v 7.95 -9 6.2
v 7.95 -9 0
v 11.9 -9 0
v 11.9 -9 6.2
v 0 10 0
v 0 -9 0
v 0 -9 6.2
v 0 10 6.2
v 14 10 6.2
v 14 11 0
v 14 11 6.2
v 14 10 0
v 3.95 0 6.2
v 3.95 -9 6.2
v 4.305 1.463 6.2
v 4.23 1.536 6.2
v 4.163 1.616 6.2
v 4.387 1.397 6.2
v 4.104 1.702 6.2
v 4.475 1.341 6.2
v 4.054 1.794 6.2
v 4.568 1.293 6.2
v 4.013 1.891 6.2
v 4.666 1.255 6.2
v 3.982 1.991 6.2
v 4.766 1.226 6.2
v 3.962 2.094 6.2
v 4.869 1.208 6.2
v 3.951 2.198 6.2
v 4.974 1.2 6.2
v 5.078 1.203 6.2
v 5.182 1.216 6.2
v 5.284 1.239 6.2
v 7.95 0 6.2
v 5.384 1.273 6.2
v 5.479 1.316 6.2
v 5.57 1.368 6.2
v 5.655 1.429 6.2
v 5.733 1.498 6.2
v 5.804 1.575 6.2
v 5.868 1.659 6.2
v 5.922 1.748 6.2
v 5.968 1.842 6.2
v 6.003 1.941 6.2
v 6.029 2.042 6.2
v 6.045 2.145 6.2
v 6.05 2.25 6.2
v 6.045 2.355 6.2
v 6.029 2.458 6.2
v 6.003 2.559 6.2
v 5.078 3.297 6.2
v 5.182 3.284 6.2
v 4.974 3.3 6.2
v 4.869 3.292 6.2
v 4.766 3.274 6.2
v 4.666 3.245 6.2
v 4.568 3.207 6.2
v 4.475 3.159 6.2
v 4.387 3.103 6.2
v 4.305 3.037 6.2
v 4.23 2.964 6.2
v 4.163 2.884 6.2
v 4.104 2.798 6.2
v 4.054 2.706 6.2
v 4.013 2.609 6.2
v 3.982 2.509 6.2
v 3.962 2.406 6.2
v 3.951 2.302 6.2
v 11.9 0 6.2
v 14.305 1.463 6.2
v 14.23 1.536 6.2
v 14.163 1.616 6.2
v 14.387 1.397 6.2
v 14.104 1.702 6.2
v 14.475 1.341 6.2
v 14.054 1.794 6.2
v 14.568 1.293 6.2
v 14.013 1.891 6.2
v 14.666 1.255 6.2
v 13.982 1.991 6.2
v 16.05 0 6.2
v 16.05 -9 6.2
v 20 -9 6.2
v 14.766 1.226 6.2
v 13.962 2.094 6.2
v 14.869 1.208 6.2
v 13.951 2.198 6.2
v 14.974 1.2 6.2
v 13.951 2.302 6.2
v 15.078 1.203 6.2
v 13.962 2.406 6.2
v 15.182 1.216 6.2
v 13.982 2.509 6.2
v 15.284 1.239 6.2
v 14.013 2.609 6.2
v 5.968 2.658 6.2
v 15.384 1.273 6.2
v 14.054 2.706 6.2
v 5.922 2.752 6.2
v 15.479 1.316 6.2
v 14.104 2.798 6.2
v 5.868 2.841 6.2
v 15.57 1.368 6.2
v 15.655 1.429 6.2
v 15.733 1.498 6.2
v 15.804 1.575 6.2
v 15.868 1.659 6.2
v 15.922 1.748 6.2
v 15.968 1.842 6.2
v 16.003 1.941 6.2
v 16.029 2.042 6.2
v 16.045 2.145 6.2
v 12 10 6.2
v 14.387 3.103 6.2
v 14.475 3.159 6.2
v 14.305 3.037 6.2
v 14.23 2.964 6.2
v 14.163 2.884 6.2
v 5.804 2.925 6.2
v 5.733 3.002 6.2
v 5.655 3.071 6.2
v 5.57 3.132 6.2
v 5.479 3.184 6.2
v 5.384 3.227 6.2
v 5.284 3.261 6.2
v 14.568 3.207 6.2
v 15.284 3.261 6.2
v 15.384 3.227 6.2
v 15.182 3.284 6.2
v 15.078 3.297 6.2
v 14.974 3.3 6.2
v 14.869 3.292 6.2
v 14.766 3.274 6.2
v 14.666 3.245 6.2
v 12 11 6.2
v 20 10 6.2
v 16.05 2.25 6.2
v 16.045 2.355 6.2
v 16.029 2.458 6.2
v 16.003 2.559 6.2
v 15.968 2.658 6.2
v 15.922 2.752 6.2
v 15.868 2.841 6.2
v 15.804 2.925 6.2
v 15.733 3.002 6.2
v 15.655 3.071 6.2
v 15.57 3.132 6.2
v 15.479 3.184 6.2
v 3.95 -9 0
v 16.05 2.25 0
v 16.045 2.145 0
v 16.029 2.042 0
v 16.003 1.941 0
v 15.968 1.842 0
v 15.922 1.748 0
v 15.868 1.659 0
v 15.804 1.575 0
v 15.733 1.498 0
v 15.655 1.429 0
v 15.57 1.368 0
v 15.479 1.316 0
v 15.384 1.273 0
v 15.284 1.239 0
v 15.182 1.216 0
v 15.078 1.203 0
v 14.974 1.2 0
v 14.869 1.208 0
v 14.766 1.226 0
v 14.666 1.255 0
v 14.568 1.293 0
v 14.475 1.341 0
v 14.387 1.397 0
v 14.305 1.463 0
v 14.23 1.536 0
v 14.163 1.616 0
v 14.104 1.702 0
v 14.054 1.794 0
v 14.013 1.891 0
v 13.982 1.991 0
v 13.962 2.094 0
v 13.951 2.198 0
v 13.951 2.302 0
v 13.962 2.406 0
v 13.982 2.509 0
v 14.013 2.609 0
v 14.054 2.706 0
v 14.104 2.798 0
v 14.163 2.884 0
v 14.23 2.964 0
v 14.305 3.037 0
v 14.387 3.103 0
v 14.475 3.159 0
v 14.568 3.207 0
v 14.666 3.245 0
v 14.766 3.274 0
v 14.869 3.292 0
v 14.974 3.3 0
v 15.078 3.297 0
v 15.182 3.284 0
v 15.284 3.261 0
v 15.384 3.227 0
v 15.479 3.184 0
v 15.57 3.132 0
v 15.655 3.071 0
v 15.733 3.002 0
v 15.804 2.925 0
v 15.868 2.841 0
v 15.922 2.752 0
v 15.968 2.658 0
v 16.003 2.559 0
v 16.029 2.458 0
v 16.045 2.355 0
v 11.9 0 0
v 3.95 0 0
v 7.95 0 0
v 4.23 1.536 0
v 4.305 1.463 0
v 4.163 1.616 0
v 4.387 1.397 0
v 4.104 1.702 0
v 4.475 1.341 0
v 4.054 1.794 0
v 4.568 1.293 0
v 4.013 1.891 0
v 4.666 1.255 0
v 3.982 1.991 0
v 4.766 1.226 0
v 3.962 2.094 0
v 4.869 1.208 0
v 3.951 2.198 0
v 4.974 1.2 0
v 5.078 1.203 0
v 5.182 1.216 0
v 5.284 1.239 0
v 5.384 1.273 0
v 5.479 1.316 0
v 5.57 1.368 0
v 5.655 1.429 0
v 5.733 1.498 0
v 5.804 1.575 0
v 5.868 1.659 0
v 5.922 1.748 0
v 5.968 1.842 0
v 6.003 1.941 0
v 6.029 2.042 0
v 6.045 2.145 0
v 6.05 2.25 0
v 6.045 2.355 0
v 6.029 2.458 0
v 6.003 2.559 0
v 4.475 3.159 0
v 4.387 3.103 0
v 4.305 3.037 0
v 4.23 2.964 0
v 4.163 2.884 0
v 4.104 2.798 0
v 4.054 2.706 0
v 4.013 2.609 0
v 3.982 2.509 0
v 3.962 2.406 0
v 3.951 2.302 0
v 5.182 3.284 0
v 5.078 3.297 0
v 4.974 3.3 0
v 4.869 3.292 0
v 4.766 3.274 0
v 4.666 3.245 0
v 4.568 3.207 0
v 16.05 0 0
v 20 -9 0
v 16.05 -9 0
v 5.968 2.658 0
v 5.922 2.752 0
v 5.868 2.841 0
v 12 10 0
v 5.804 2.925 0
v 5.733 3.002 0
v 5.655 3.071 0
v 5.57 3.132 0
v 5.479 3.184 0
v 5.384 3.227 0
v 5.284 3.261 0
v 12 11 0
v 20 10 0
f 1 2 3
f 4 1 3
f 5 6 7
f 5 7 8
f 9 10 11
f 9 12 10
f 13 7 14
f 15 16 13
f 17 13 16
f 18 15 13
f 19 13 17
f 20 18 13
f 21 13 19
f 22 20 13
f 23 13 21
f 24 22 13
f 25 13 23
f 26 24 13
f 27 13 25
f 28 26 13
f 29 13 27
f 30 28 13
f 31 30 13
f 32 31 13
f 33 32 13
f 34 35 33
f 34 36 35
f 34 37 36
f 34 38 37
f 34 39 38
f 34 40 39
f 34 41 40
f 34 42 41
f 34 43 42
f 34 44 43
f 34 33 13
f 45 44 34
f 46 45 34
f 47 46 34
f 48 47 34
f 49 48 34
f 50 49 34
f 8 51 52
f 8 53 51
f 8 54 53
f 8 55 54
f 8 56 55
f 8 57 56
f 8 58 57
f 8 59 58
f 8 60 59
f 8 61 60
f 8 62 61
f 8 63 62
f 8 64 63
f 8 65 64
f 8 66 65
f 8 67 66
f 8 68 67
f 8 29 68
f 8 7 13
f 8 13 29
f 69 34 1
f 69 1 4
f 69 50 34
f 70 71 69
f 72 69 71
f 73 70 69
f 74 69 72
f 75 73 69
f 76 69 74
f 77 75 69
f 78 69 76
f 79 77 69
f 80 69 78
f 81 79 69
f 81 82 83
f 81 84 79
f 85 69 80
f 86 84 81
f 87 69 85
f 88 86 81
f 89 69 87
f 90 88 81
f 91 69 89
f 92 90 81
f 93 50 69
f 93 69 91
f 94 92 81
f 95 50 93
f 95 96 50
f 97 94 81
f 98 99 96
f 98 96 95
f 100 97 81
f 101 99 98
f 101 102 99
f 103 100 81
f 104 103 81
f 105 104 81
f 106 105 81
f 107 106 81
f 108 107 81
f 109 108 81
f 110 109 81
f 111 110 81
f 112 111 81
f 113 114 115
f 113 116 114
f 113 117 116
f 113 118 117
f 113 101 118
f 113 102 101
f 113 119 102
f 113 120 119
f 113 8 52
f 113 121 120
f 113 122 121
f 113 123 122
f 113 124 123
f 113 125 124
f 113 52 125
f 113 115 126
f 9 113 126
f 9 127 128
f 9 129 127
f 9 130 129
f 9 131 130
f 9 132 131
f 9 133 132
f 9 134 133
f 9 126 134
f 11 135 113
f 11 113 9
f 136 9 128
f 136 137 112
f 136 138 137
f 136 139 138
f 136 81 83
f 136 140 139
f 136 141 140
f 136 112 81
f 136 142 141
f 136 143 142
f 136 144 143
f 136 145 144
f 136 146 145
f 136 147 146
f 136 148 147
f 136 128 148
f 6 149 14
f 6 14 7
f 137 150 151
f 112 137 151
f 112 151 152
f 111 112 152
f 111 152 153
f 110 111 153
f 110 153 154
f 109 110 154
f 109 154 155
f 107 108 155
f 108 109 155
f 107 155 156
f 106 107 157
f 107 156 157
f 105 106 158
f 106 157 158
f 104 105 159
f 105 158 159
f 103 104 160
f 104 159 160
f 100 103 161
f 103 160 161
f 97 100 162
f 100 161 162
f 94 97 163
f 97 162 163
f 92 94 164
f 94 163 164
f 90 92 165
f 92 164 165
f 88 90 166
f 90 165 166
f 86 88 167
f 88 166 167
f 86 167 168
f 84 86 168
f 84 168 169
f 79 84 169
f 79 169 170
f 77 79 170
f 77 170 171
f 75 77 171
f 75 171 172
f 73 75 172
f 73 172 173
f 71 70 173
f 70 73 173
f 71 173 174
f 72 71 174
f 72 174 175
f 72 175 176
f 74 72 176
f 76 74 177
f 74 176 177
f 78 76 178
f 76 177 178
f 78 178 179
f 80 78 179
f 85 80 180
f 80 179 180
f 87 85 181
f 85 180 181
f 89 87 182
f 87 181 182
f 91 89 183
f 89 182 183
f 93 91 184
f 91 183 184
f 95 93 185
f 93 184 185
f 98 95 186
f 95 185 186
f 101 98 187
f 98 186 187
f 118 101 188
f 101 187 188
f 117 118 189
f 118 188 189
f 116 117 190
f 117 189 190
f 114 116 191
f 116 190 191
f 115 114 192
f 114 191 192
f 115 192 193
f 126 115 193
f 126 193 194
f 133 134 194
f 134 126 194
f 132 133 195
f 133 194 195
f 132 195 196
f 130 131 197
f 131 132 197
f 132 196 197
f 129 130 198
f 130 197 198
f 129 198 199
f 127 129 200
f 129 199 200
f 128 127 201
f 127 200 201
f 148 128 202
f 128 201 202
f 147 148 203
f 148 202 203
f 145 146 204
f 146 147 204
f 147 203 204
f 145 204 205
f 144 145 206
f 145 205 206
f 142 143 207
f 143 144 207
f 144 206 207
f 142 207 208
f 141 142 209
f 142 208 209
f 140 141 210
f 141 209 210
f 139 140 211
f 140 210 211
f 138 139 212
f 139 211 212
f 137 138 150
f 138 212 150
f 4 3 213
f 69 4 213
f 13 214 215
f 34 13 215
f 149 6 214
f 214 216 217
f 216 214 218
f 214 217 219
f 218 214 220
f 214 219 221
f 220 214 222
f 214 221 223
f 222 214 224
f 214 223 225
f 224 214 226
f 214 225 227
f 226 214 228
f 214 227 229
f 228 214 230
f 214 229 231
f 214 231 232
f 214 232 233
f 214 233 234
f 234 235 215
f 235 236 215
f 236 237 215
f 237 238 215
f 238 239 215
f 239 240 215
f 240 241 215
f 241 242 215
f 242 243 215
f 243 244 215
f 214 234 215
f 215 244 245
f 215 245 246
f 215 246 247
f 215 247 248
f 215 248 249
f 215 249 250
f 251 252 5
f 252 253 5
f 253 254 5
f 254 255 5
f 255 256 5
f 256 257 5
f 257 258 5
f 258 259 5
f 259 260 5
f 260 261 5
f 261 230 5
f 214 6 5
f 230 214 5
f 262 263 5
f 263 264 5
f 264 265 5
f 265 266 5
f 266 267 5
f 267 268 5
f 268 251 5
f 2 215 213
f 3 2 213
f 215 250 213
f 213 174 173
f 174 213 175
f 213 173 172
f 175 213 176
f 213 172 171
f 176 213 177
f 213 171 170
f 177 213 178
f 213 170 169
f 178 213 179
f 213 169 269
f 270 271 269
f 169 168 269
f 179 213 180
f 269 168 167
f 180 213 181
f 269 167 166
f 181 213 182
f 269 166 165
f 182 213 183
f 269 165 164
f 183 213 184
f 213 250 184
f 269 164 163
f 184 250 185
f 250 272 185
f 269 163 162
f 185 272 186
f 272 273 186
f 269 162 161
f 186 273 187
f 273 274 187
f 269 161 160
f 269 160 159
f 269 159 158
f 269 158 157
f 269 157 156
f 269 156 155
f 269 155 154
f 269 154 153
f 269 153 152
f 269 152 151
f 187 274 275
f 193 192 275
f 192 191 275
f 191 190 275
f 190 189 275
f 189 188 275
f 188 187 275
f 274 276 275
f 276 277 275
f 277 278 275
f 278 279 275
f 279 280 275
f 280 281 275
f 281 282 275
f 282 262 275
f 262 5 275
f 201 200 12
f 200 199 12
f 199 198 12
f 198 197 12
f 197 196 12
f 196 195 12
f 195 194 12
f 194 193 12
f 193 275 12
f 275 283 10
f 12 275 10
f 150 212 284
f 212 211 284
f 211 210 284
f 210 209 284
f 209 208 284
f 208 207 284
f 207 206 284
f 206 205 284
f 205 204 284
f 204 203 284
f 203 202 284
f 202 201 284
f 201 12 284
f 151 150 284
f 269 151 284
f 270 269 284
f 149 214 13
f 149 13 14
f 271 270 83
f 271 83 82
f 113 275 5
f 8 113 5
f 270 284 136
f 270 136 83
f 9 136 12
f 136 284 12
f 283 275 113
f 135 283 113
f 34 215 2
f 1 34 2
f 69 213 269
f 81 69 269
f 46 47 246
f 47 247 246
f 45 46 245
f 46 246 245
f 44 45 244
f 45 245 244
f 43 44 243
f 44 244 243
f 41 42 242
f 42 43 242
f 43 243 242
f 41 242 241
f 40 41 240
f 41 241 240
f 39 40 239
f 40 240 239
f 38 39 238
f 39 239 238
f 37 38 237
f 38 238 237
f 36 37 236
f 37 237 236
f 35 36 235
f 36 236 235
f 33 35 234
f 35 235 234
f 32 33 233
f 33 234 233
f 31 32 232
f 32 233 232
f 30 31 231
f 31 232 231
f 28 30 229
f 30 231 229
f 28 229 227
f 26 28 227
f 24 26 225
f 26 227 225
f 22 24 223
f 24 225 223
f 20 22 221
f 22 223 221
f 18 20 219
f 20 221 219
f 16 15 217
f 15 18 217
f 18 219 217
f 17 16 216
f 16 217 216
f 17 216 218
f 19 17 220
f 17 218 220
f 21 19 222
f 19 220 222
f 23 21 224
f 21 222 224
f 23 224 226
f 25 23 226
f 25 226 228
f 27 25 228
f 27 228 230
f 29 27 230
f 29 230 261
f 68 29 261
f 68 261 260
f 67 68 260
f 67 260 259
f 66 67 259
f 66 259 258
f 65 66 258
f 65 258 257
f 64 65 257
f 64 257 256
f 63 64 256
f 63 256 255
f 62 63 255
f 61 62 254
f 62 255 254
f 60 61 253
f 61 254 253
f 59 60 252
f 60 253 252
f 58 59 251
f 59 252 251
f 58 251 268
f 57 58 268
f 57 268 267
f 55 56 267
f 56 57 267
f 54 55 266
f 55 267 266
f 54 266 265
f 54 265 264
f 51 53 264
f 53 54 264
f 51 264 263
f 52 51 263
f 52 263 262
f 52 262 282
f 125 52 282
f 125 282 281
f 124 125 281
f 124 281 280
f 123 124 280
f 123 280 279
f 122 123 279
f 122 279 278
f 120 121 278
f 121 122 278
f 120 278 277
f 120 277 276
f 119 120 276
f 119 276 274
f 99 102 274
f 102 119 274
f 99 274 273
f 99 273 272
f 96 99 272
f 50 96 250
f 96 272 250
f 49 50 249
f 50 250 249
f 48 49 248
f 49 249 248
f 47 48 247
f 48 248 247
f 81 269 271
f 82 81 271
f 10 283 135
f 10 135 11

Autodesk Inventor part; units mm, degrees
ref_plane "YZ Plane" through (0, 0, 0) normal (1, 0, 0) x (0, 1, 0)
ref_plane "XZ Plane" through (0, 0, 0) normal (0, 1, 0) x (-1, 0, 0)
ref_plane "XY Plane" through (0, 0, 0) normal (0, 0, 1) x (1, 0, 0)
sketch "Sketch1" plane through (0, 0, 0) normal (0, 0, 1) x (1, 0, 0)
  line L0 (20, 0) -> (20, 10)
  line L1 (20, 10) -> (0, 10)
  line L2 (0, 10) -> (0, 0)
  circle A0 centre (5, 2.25) radius 1.05
  circle A1 centre (15, 2.25) radius 1.05
  line L3 (20, 0) -> (20, -9)
  line L4 (0, -9) -> (0, 0)
  line L5 (3.95, 0) -> (3.95, -9)
  line L6 (16.05, 0) -> (16.05, -9)
  line L7 (7.95, 0) -> (7.95, -9)
  line L8 (7.95, -9) -> (11.9, -9)
  line L9 (11.9, -9) -> (11.9, 0)
  line L10 (3.95, 0) -> (7.95, 0)
  line L11 (11.9, 0) -> (16.05, 0)
  line L12 (3.95, 0) -> (7.95, 0)
  line L13 (11.9, 0) -> (16.05, 0)
  line L14 (3.95, -9) -> (0, -9)
  line L15 (20, -9) -> (16.05, -9)
  line L16 (11.9, -9) -> (7.95, -9)
  line L17 (0, -9) -> (0, 10)
  line L18 (20, 10) -> (0, 10)
  line L19 (20, 10) -> (20, -9)
  line L20 (20, -9) -> (16.05, -9)
  line L21 (16.05, -9) -> (16.05, 0)
  line L22 (16.05, 0) -> (11.9, 0)
  line L23 (11.9, -9) -> (7.95, -9)
  line L24 (7.95, -9) -> (7.95, 0)
  line L25 (7.95, 0) -> (3.95, 0)
  dimension "d0" = 20
  dimension "d1" = 10
  dimension "d2" = 2.1
  dimension "d3" = 2.1
  dimension "d4" = 5
  dimension "d5" = 5
  dimension "d12" = 9
  dimension "d13" = 3.95
  dimension "d14" = 4
extrude "Extrusion3" add sketch "Sketch1" along normal blind 6.2
sketch "Sketch3" plane through (0, 10, 0) normal (0, 1, 0) x (1, 0, 0)
  line L0 (20, 0) -> (0, 0) projected
  line L1 (20, -6.2) -> (0, -6.2) projected
  line L2 (20, 0) -> (20, -6.2) projected
  line L3 (14, 0) -> (14, -6.2)
  line L4 (12, 0) -> (12, -6.2)
  dimension "d17" = 6
  dimension "d18" = 2
extrude "Extrusion4" add sketch "Sketch3" along normal blind 1 contours L3 L1 L4 L0
properties part number "endstop"
